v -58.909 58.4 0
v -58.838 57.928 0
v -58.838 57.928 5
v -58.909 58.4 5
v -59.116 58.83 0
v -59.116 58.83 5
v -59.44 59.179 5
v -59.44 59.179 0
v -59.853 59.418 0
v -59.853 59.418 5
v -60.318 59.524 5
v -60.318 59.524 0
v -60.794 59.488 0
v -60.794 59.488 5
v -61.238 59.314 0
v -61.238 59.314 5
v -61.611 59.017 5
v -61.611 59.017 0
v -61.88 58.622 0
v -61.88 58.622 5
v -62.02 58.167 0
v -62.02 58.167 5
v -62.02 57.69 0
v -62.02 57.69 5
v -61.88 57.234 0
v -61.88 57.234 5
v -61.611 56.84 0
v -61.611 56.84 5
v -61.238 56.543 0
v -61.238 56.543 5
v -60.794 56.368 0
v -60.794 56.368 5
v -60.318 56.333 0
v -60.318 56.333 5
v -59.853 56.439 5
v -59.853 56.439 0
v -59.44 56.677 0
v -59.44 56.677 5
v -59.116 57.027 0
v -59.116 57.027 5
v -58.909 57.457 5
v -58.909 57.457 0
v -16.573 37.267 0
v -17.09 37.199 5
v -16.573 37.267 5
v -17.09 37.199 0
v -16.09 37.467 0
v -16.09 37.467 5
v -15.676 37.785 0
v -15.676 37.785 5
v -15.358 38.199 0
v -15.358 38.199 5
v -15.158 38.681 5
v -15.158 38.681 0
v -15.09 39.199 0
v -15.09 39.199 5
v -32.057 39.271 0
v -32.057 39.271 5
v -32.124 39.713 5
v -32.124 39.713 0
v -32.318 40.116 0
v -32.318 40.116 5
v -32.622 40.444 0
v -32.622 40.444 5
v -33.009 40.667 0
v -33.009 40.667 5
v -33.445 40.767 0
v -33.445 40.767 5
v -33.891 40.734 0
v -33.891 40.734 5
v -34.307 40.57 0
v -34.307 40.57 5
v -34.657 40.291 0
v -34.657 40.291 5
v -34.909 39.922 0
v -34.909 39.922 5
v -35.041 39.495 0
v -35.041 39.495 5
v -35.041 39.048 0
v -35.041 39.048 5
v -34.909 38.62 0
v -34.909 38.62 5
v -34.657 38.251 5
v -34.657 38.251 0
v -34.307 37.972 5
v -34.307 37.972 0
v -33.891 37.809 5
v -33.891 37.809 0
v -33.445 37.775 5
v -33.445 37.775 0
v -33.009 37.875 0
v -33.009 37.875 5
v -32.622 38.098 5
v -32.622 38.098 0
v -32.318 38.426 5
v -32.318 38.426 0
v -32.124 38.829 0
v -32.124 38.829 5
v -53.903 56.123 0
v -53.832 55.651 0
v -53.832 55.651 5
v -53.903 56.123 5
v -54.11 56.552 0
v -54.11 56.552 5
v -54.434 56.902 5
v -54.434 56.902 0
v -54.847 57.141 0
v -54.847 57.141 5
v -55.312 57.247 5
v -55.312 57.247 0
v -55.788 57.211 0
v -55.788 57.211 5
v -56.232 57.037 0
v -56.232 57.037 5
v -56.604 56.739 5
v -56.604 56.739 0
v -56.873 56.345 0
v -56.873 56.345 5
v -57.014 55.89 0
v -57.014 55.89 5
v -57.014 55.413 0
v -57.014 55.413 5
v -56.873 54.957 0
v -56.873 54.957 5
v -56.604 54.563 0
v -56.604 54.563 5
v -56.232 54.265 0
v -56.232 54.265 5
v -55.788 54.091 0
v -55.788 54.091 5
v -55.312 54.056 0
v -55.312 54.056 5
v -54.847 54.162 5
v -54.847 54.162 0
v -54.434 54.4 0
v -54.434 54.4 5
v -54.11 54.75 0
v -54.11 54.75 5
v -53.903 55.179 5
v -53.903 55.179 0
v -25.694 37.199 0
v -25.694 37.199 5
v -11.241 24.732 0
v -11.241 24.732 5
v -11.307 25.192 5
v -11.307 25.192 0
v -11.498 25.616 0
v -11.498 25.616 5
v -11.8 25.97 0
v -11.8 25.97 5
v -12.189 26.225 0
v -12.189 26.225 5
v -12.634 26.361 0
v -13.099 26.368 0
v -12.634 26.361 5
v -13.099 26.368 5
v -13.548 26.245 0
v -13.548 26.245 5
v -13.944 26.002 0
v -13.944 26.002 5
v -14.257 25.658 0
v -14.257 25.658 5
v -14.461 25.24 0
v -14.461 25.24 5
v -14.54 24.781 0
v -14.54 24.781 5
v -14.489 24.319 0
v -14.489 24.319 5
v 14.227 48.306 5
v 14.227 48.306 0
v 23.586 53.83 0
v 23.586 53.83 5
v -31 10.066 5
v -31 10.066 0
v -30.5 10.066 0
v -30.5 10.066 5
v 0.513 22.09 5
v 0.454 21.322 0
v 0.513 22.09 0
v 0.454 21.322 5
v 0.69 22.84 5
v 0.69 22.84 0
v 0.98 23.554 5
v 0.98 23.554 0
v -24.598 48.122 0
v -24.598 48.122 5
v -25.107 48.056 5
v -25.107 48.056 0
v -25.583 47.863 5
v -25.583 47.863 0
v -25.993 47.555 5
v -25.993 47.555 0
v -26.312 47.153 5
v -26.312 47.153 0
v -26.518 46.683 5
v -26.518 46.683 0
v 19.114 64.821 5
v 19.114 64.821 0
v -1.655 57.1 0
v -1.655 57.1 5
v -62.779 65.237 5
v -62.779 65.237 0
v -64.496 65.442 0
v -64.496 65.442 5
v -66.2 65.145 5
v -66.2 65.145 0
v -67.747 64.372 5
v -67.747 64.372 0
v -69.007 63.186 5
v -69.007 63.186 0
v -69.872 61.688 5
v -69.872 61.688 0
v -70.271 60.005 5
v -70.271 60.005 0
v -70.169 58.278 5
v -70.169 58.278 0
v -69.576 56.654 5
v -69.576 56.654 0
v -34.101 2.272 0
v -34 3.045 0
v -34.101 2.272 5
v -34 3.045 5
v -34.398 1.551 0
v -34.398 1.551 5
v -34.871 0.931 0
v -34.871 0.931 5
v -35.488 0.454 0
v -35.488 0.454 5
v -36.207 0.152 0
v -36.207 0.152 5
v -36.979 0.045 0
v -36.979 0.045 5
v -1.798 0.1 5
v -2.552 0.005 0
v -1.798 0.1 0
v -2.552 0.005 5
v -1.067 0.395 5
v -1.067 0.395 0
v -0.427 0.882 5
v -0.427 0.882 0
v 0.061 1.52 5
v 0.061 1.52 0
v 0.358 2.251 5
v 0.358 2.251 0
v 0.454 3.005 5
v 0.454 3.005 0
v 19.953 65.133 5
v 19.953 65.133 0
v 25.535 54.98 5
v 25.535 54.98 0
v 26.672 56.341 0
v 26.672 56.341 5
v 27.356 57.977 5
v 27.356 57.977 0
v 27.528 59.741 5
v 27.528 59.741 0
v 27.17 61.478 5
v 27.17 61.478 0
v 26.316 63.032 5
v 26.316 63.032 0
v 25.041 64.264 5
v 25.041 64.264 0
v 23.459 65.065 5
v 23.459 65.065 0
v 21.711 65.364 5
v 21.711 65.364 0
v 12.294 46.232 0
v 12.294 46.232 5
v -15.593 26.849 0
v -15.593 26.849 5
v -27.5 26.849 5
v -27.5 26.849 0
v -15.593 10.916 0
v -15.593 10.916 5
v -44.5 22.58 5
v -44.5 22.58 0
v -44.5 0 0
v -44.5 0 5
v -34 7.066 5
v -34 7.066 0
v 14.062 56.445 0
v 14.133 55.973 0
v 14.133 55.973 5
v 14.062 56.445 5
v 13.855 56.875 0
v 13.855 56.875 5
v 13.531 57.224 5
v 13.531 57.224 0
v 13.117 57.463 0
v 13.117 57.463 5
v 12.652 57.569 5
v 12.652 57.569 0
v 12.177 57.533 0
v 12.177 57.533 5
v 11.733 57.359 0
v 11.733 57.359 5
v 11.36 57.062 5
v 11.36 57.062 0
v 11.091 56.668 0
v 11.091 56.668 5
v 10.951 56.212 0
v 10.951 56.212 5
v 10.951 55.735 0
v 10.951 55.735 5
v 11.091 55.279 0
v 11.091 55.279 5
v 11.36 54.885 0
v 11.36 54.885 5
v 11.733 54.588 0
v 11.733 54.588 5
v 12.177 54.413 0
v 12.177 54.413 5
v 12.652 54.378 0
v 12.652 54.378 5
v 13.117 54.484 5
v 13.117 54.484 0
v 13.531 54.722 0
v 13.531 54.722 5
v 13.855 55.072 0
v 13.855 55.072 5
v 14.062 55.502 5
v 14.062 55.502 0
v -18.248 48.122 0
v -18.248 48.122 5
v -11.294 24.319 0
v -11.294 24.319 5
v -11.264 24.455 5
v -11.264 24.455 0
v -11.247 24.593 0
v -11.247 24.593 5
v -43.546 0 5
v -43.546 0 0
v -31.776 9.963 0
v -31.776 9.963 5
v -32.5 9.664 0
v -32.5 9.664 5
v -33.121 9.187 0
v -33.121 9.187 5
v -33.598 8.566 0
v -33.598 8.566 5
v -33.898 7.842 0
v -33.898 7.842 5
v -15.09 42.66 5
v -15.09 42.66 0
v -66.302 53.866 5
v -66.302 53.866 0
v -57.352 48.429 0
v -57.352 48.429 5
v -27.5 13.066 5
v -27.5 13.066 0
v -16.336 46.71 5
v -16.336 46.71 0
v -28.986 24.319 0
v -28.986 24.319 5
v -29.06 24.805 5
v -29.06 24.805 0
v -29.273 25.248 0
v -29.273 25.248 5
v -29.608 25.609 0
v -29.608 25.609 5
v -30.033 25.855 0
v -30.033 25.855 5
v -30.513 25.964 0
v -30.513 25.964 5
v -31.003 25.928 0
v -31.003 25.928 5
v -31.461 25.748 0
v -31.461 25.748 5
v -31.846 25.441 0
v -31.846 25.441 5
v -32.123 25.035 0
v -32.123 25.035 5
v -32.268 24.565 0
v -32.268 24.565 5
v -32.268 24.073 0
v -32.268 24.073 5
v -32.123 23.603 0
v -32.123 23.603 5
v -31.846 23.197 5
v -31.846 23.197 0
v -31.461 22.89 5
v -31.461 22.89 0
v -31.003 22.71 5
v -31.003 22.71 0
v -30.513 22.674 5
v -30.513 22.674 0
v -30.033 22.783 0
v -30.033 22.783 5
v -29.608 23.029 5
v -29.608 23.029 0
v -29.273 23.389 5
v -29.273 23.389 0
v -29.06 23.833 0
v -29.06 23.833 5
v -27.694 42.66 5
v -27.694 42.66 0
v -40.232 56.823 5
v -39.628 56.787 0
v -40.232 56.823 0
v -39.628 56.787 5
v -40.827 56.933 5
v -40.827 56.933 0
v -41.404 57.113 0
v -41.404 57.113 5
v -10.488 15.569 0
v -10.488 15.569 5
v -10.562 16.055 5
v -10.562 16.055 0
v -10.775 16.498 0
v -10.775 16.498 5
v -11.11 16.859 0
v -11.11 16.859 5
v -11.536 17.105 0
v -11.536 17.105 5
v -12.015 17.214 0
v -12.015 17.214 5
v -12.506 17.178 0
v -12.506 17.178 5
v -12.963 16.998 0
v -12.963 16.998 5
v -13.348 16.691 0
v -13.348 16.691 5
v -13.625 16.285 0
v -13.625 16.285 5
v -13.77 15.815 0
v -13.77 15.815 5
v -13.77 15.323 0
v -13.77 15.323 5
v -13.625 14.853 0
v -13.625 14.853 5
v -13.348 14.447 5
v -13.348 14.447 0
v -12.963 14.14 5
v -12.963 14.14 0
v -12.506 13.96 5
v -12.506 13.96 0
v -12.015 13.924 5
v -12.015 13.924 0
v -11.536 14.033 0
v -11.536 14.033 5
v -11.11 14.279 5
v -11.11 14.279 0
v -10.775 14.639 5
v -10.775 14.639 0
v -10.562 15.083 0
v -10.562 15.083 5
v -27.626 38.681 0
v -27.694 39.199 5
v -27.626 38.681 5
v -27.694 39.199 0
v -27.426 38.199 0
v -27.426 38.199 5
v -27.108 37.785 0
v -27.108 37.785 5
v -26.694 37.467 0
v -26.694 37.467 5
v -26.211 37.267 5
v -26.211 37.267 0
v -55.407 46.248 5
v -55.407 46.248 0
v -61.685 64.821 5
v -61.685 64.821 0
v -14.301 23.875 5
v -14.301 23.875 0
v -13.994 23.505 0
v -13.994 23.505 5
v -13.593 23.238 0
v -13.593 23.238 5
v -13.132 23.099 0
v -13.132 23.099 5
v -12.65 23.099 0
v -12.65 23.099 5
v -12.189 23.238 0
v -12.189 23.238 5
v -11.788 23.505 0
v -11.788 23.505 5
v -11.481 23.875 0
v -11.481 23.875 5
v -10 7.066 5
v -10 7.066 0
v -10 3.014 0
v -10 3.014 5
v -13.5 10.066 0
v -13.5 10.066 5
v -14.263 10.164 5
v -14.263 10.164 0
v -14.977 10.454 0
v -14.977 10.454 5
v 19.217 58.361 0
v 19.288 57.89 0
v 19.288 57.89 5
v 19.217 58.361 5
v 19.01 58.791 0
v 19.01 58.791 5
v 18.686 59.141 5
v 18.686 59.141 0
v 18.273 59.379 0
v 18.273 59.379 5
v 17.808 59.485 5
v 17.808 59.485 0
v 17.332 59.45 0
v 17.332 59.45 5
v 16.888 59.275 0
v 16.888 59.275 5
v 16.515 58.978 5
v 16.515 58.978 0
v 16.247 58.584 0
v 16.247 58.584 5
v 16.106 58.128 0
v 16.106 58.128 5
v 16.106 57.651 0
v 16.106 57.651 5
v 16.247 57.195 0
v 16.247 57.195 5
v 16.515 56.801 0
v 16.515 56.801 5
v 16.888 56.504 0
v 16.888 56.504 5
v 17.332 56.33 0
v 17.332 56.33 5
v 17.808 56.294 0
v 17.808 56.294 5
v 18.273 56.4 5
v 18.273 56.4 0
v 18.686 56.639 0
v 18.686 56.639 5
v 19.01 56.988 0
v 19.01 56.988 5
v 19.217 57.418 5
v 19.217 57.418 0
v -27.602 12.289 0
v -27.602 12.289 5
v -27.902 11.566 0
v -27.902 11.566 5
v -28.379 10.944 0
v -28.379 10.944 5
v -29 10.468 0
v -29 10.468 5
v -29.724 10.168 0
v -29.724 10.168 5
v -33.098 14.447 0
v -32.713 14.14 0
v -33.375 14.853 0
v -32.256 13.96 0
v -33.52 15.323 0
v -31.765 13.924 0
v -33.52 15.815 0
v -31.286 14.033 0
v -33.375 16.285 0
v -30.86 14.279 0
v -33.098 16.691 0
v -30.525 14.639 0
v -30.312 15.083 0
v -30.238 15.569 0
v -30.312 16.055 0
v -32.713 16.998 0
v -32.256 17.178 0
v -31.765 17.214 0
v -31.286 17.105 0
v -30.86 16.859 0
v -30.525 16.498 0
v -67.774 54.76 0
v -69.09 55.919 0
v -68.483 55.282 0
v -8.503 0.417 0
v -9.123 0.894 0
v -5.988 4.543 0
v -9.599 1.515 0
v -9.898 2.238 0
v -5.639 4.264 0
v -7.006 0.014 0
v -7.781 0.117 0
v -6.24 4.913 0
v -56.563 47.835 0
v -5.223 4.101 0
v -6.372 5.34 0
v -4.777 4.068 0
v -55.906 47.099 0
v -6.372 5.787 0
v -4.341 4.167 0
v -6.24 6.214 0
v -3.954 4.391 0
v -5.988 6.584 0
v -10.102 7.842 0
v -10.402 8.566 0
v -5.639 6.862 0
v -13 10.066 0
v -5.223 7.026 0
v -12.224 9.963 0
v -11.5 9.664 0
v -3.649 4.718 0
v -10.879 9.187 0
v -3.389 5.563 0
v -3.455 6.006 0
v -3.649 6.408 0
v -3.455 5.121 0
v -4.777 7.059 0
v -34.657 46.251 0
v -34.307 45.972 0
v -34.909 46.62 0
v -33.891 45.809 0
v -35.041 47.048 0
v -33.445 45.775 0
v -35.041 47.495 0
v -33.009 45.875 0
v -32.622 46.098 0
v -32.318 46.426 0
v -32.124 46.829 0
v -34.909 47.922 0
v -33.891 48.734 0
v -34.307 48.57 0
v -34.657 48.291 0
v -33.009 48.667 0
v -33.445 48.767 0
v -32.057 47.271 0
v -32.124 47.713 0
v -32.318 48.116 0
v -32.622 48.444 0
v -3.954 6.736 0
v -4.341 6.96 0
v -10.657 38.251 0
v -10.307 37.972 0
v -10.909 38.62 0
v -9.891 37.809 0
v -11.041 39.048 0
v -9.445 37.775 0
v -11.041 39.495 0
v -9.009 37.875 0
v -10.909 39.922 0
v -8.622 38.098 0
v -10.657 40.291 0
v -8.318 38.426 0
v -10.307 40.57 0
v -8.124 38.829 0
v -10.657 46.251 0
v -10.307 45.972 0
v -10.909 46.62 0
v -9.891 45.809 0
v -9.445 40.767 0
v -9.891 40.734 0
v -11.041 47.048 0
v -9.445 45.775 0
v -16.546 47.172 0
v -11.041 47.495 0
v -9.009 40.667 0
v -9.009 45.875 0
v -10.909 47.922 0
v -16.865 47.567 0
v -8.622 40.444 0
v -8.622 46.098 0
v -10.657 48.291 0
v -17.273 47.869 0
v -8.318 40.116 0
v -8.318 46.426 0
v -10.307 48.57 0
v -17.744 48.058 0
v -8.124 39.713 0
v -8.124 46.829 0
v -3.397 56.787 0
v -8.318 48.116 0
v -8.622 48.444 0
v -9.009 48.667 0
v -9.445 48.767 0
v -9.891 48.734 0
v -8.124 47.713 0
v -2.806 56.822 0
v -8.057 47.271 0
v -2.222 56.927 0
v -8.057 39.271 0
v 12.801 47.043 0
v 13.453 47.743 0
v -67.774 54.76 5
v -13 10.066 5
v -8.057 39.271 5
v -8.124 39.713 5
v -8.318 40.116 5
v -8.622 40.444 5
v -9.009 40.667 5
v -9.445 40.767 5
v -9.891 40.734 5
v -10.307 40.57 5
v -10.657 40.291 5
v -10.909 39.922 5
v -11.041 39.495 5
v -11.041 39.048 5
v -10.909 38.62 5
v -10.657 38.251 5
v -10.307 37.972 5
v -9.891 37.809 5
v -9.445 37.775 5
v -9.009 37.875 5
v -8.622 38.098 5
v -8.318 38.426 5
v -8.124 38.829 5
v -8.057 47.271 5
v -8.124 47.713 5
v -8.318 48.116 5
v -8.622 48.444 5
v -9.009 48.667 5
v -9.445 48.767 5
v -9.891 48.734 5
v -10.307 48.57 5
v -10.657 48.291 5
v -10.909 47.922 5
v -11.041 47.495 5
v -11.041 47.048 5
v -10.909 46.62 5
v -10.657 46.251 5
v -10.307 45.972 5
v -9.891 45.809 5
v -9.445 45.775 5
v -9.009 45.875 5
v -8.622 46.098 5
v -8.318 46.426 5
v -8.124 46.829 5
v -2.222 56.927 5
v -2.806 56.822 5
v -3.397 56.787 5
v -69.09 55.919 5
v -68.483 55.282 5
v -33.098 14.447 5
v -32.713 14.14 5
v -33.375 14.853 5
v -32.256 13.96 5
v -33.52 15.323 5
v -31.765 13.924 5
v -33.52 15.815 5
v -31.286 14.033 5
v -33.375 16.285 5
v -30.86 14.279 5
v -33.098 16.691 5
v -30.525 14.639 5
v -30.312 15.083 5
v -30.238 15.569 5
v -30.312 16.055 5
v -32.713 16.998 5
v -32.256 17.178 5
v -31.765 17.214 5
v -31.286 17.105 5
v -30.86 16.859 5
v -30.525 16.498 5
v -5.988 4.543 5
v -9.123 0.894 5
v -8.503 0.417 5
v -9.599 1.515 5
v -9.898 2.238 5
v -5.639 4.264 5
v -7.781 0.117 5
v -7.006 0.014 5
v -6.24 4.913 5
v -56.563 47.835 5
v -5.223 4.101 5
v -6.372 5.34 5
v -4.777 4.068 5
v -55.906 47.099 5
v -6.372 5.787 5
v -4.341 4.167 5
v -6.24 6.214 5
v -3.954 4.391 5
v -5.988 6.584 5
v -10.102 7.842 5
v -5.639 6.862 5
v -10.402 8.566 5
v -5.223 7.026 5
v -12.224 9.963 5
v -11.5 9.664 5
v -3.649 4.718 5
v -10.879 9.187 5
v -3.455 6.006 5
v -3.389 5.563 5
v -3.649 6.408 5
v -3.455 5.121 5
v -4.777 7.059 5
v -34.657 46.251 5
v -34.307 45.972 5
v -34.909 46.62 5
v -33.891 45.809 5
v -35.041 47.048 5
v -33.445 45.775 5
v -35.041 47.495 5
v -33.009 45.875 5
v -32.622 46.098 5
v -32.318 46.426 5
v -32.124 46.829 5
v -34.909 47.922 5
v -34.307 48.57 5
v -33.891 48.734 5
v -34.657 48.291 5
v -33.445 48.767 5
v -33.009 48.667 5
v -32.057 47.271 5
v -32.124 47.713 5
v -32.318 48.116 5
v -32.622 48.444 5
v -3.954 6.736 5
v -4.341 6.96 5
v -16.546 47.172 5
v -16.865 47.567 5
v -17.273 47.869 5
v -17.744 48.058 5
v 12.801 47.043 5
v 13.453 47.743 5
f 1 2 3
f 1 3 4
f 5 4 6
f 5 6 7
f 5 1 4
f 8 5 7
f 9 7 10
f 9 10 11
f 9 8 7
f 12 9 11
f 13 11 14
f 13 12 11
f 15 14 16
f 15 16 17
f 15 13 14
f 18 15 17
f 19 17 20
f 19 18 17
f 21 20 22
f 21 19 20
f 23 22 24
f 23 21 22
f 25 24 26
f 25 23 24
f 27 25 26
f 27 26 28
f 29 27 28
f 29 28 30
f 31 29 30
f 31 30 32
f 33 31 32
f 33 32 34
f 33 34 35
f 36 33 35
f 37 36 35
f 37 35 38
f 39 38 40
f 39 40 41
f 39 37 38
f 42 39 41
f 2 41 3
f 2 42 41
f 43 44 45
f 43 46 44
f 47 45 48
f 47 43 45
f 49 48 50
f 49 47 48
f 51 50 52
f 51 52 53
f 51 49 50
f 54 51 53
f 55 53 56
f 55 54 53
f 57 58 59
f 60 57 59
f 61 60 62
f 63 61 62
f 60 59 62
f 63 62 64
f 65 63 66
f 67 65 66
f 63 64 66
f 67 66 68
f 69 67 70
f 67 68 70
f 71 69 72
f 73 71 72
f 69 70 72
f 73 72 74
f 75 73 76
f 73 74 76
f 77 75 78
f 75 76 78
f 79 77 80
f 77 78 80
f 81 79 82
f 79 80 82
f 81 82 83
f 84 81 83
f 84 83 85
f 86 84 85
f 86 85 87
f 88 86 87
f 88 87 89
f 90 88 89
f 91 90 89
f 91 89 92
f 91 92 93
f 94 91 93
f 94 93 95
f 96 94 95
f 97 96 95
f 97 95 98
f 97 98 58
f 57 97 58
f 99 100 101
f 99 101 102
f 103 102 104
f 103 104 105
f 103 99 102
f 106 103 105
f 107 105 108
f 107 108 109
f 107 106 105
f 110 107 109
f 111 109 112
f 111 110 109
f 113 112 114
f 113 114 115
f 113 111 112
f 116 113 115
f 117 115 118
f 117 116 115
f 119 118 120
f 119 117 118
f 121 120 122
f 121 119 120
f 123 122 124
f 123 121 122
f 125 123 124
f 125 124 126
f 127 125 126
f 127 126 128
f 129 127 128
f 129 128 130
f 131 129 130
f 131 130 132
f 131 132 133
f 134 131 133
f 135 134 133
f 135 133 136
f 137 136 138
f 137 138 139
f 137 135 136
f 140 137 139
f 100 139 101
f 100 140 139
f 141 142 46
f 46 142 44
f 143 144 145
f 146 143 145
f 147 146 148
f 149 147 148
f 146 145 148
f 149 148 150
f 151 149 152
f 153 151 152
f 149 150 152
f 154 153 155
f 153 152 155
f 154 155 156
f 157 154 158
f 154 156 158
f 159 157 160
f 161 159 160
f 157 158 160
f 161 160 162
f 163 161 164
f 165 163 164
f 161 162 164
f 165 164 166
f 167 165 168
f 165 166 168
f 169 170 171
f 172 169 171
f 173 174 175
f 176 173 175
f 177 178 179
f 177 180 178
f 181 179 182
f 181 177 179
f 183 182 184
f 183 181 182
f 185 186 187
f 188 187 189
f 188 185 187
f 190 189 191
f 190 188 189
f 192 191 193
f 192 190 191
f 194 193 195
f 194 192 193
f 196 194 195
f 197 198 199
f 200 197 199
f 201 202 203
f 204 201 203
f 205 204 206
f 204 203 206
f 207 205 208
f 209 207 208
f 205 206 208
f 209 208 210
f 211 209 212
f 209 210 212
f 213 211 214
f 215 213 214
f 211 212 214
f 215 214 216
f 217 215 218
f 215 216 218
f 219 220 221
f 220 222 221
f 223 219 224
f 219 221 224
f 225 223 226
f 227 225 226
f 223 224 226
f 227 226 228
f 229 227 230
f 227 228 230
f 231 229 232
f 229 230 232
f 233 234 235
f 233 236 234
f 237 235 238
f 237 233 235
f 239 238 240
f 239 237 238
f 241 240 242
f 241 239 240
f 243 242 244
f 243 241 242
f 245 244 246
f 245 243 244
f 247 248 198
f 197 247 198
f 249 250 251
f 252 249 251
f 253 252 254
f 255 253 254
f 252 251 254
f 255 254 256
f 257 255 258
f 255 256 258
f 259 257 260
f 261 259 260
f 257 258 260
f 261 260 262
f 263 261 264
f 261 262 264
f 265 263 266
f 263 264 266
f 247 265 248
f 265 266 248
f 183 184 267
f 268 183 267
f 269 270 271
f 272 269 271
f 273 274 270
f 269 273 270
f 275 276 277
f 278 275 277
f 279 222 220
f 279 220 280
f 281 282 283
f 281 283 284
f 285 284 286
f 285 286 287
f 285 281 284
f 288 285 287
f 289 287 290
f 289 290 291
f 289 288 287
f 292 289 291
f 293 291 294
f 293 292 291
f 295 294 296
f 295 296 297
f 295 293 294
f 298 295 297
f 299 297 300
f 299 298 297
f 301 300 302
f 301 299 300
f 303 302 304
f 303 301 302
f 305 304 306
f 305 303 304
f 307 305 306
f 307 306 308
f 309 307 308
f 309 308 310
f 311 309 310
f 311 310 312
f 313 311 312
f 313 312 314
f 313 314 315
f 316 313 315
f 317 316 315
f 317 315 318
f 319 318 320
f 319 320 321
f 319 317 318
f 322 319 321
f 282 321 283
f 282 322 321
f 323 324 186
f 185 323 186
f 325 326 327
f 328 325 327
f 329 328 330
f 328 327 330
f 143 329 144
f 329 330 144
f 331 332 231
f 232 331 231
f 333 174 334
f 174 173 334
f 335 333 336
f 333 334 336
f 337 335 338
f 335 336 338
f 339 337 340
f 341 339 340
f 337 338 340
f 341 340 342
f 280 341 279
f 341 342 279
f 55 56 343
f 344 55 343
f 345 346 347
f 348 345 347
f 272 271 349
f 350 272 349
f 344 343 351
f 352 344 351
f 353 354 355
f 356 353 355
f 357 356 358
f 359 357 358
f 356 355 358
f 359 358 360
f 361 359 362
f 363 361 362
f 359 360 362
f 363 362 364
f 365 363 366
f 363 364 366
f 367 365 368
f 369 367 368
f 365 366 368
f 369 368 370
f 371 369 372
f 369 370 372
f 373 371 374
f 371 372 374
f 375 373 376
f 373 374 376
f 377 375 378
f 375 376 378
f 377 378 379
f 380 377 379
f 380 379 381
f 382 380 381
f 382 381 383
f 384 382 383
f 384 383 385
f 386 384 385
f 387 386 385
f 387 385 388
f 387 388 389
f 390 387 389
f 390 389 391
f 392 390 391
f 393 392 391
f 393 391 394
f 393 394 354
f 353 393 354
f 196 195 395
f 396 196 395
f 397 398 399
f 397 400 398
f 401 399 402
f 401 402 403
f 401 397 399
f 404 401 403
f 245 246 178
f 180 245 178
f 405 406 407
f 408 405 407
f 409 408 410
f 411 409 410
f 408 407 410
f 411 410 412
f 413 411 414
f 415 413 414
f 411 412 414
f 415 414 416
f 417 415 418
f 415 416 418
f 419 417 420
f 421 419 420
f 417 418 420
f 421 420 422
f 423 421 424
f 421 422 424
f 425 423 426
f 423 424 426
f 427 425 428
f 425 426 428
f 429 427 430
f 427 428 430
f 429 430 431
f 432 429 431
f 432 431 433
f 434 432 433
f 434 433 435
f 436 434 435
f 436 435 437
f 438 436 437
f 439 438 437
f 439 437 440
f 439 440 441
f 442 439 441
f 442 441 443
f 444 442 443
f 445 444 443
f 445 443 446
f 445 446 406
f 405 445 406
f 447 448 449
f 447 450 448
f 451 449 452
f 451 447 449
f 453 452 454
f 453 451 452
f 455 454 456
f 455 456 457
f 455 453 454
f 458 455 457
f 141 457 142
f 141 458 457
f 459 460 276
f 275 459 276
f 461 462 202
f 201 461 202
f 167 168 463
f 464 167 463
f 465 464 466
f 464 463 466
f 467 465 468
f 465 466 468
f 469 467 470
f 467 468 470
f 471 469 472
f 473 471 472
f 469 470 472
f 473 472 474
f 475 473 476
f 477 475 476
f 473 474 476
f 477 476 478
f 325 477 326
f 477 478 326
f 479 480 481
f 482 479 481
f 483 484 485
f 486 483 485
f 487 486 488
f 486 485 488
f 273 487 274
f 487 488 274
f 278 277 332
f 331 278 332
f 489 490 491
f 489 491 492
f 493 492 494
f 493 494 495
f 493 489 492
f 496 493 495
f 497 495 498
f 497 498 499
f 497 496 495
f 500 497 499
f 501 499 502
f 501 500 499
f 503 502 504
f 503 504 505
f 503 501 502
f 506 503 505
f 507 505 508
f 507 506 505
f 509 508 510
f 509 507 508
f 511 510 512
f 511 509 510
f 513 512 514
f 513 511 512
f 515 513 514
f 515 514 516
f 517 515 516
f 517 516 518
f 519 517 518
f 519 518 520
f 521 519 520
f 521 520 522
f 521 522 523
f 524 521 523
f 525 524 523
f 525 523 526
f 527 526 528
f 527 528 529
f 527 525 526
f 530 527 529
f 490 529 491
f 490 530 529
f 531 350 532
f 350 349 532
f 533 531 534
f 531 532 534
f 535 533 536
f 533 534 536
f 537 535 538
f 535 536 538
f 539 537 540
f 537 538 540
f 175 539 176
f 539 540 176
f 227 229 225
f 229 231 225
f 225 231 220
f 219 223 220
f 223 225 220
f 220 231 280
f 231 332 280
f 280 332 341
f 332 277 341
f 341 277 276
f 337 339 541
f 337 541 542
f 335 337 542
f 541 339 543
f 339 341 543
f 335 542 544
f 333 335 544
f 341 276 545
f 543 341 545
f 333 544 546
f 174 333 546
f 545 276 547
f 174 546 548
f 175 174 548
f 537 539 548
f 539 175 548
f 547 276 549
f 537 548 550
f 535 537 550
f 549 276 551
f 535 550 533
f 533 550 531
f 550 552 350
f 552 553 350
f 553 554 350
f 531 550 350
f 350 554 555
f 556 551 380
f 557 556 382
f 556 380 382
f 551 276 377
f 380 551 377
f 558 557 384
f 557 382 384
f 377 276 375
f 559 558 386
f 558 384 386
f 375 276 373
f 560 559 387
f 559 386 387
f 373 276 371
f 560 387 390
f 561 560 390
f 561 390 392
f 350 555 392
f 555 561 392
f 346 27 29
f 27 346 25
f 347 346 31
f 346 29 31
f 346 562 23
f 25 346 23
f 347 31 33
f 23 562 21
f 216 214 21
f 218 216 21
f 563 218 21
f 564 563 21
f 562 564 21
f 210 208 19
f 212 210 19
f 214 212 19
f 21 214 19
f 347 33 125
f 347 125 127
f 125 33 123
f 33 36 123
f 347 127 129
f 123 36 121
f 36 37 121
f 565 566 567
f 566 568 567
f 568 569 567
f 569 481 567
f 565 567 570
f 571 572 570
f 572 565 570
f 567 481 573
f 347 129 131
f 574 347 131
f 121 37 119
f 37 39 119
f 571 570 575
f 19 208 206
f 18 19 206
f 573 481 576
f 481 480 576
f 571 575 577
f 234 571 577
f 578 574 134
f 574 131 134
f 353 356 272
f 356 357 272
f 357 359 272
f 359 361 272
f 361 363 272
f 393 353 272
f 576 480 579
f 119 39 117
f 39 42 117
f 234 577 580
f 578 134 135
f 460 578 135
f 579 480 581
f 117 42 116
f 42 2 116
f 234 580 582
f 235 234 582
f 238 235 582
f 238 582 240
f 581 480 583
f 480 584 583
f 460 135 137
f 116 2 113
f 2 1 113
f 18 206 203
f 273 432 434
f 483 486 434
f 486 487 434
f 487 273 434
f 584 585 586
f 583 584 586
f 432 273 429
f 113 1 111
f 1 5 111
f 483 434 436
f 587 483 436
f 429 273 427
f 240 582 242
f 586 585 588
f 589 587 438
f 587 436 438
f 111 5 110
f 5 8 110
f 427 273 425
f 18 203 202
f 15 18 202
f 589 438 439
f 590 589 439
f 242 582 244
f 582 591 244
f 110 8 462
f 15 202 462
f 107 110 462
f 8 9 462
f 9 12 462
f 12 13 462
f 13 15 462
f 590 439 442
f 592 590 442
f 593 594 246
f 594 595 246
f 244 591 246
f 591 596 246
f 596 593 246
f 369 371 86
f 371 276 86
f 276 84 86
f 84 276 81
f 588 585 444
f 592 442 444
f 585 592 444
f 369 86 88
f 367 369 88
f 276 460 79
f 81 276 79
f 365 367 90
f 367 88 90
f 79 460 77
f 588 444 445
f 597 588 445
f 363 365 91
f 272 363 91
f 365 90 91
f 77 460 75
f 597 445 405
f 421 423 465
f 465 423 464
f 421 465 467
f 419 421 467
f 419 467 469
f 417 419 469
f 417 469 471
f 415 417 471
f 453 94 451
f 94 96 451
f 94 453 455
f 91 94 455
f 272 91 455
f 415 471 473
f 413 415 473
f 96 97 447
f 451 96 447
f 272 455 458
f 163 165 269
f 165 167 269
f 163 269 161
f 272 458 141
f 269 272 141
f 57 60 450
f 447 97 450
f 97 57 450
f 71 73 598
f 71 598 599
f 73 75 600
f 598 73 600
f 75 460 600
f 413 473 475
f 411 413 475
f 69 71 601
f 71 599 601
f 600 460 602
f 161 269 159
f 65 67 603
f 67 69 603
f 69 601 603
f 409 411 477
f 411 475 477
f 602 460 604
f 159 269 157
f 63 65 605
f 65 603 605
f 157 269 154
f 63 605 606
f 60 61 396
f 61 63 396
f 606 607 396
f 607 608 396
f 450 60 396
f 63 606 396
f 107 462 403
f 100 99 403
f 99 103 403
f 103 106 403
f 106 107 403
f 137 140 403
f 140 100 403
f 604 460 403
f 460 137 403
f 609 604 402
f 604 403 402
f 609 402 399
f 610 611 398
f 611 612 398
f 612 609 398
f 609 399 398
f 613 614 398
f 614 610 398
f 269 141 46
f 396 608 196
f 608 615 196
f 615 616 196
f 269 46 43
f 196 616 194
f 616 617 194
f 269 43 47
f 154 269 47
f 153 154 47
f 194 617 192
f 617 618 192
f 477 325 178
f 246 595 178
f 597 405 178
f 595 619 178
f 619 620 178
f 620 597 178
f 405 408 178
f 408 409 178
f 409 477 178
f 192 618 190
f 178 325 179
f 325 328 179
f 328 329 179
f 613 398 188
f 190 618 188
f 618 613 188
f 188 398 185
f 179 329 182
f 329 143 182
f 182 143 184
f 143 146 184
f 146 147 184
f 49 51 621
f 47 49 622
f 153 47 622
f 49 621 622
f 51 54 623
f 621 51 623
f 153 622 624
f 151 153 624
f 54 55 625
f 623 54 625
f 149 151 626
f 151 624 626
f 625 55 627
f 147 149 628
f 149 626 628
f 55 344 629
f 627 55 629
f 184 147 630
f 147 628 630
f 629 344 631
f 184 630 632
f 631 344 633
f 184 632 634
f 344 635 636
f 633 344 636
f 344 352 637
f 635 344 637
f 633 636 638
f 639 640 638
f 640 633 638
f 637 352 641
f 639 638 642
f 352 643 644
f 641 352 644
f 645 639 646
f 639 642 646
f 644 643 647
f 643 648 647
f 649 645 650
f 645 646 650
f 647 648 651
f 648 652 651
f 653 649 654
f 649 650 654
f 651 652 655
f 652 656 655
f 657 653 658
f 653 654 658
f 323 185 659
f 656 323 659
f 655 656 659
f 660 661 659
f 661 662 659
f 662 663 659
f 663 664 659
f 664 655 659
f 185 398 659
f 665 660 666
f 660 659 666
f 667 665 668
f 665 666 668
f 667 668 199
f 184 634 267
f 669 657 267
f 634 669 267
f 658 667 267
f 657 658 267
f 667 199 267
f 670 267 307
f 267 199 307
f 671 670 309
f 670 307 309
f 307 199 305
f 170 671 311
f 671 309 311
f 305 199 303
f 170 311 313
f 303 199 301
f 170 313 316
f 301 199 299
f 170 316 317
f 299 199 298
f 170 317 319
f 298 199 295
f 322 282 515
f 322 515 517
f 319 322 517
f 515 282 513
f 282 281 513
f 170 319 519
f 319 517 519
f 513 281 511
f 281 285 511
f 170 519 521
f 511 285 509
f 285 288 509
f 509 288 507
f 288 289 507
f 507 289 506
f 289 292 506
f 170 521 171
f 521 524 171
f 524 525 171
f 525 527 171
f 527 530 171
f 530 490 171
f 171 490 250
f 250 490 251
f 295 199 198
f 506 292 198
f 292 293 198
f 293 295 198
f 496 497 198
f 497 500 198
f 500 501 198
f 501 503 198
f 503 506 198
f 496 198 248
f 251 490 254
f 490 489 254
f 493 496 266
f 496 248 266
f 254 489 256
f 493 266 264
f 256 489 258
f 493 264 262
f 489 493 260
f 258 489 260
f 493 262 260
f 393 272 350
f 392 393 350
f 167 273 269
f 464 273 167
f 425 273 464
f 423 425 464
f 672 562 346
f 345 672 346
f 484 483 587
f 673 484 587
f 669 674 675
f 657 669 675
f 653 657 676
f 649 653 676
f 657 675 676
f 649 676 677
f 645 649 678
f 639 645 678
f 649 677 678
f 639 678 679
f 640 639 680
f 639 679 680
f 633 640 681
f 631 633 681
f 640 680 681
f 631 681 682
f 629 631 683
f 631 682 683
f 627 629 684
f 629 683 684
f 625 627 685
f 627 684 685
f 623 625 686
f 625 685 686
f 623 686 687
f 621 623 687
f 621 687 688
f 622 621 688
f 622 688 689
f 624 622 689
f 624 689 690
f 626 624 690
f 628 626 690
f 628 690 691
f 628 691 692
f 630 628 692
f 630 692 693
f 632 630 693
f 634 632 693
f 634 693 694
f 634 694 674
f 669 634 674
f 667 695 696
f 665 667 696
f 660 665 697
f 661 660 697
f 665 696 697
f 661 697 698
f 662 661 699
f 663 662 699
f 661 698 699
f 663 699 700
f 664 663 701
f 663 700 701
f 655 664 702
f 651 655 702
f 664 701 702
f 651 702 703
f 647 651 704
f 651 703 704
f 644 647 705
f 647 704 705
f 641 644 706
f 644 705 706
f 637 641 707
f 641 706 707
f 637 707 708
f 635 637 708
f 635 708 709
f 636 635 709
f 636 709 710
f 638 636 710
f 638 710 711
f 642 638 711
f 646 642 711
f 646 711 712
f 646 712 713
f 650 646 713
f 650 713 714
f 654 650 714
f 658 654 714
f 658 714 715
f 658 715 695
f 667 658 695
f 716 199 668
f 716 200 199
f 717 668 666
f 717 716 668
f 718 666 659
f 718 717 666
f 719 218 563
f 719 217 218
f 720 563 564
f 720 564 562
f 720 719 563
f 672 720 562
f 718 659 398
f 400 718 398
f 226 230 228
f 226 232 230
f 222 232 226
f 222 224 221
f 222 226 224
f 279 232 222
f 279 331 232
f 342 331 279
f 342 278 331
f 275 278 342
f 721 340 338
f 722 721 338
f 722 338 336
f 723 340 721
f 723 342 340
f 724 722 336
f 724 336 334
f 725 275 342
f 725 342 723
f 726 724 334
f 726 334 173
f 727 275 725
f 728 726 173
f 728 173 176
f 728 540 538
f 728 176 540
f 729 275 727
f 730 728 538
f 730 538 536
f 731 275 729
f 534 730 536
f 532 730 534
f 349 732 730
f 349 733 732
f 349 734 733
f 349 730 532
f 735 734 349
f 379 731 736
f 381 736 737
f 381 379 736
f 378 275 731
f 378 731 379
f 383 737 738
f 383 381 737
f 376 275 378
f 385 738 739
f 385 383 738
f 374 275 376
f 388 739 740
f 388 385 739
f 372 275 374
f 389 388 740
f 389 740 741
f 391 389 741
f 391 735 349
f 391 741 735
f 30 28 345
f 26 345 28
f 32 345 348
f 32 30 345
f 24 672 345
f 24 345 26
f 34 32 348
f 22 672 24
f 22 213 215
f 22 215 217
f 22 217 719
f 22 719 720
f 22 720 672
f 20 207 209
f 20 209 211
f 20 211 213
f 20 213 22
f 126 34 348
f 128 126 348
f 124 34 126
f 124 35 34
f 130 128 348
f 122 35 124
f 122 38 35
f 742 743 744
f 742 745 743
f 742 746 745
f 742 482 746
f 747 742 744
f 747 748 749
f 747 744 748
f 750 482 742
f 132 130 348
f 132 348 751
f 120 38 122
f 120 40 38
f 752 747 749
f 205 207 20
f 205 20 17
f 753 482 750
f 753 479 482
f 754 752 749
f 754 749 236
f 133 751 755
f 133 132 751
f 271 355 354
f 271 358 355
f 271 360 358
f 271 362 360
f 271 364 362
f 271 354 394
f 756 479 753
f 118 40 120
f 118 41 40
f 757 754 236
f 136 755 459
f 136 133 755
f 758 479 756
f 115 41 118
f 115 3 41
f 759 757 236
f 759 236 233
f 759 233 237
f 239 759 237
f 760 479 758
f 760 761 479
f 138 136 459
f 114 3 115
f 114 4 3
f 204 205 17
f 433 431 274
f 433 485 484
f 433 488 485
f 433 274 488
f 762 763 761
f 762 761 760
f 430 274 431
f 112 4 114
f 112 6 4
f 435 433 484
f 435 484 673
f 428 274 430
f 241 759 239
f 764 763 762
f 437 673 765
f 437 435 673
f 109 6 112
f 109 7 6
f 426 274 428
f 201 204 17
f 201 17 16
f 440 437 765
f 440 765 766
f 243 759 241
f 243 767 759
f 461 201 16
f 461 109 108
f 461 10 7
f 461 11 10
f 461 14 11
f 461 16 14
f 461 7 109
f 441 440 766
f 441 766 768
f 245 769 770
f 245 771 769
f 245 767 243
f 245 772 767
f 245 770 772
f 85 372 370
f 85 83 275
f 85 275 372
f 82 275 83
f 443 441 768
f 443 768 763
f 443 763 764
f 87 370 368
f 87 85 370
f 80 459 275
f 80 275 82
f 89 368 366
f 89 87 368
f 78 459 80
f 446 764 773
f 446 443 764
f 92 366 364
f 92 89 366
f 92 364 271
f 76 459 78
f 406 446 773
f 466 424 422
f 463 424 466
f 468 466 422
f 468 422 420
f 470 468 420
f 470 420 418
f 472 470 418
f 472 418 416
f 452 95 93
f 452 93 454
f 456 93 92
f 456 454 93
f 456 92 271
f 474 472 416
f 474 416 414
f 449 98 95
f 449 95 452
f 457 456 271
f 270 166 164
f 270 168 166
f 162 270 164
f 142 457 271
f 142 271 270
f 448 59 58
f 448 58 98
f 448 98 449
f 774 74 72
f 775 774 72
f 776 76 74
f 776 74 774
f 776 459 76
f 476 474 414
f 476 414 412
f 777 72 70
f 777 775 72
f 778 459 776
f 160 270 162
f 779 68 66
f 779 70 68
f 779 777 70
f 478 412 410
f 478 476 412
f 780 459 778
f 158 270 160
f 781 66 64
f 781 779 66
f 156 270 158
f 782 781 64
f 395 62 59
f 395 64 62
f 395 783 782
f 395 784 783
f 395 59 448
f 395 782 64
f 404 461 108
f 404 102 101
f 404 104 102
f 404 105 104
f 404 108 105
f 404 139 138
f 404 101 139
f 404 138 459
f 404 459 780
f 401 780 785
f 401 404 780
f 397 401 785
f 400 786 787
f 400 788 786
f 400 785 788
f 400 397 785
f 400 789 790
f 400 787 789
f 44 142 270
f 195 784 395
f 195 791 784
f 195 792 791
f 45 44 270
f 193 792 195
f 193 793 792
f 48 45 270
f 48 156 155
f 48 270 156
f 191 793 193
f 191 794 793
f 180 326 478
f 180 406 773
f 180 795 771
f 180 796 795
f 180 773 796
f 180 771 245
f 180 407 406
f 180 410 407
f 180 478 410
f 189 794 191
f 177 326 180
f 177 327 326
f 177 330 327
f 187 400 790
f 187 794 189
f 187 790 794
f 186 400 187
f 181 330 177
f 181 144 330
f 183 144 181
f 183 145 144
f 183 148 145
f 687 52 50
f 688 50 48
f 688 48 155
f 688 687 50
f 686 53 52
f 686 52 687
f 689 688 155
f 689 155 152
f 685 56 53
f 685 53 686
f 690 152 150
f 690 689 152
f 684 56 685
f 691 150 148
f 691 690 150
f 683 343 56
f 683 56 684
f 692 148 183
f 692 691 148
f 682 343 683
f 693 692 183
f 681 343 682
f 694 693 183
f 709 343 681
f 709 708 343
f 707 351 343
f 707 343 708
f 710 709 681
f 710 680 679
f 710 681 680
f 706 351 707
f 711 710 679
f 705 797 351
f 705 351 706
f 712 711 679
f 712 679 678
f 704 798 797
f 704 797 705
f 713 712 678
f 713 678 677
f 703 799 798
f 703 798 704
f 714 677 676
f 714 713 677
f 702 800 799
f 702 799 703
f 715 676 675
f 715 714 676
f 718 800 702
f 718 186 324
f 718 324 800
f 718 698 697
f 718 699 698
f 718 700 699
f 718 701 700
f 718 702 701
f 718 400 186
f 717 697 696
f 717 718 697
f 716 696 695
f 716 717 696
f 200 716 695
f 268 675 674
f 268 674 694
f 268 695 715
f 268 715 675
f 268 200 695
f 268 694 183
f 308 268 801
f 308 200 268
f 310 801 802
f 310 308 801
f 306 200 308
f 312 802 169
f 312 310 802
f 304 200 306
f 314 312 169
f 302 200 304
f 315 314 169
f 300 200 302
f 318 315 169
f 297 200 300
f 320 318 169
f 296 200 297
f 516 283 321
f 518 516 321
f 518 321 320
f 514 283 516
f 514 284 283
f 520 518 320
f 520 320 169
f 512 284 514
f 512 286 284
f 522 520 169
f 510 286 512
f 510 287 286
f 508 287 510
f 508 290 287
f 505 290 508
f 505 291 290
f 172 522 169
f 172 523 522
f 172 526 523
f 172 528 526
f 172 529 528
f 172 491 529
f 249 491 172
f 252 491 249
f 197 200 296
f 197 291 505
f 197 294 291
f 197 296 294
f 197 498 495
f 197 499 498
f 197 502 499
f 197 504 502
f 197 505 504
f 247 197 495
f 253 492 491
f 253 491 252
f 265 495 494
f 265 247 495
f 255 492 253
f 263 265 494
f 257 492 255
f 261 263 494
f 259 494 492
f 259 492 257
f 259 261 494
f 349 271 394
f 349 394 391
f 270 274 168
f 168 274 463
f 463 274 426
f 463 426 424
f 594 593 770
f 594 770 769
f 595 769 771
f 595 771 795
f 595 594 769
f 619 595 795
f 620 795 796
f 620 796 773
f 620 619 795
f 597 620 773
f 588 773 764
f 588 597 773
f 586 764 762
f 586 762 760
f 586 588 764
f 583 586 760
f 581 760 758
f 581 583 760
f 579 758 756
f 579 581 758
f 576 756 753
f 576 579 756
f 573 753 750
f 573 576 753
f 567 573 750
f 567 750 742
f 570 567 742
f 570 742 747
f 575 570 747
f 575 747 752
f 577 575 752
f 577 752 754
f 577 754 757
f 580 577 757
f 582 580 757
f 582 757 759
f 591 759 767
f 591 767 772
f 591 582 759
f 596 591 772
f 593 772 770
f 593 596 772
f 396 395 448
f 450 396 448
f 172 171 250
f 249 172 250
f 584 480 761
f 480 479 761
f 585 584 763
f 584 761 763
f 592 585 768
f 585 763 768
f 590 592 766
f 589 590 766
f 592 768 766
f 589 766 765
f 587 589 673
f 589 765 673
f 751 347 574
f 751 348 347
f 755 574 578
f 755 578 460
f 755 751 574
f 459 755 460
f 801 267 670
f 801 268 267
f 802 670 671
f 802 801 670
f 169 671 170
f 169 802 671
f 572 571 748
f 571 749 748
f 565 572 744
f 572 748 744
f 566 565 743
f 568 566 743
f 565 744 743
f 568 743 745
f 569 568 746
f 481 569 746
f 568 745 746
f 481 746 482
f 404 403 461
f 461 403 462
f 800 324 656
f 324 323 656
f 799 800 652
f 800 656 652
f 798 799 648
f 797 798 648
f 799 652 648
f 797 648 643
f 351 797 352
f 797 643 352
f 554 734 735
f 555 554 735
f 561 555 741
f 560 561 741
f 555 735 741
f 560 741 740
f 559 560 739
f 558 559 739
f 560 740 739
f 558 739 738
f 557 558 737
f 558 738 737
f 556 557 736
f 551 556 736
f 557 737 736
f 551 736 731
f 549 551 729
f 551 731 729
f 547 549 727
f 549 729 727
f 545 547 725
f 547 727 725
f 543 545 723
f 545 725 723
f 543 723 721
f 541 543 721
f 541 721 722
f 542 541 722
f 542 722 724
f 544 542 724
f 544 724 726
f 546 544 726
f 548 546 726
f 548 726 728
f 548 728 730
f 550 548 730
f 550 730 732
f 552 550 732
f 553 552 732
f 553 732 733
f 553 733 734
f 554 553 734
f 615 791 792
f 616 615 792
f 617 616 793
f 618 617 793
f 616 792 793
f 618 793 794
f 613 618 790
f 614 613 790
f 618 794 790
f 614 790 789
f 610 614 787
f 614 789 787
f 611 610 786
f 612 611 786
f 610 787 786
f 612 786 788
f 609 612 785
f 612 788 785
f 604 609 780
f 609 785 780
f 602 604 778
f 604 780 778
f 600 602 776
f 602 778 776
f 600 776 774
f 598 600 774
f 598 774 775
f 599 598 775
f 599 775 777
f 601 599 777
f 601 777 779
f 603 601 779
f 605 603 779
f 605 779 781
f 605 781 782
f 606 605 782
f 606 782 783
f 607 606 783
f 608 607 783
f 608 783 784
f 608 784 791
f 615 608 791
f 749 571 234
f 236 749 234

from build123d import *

# Parameters (mm, degrees)
F0_R      = 1.5
F0_R_2    = 1.6
F1_DEPTH  = 5
F2_R      = 3
F3_R      = 2
F4_R      = 5
F5_R      = 5
F6_R      = 1.5
F7_DEPTH  = 25
F9_DEPTH  = 25
F10_R     = 2
F11_R     = 1.65
F12_DEPTH = 25
F14_DEPTH = 25


with BuildPart() as f1:
    # F0 (on Top) → F1 (new body)
    with BuildSketch(Plane.XY):
        with BuildLine():
            Line((-9.9999813339, 0.0193215341), (0, 0))
            Line((0, 0), (0.4539924878, 0))
            Line((0.4539924878, 0), (0.4539924878, 22.4998891728))
            Line((0.4539924878, 22.4998891728), (12.9539924878, 47.5548288056))
            Line((12.9539924878, 47.5548288056), (23.5864712774, 53.8304637924))
            Line((23.5864712774, 53.8304637924), (25.5346026442, 54.9803143218))
            ThreePointArc((25.5346026442, 54.9803143218), (26.8013490925, 62.2870919693), (19.9533457596, 65.1328777146))
            Line((19.9533457596, 65.1328777146), (19.1141014773, 64.8209017638))
            Line((19.1141014773, 64.8209017638), (-2.4981679914, 56.7868782273))
            Line((-2.4981679914, 56.7868782273), (-40.5460603337, 56.7868782273))
            Line((-40.5460603337, 56.7868782273), (-61.6849283551, 64.8209017638))
            Line((-61.6849283551, 64.8209017638), (-62.7787610133, 65.2366230461))
            ThreePointArc((-62.7787610133, 65.2366230461), (-69.534777582, 62.3971715251), (-68.4220804384, 55.1536813523))
            Line((-68.4220804384, 55.1536813523), (-66.3019318016, 53.8657127229))
            Line((-66.3019318016, 53.8657127229), (-56.0460603337, 47.6353756185))
            Line((-56.0460603337, 47.6353756185), (-44.4999813339, 22.5804359857))
            Line((-44.4999813339, 22.5804359857), (-44.4999813339, 0))
            Line((-44.4999813339, 0), (-43.5460603337, 0))
            Line((-43.5460603337, 0), (-33.9999813339, 0.0656933026))
            Line((-33.9999813339, 0.0656933026), (-33.9999813339, 10.0656933026))
            Line((-33.9999813339, 10.0656933026), (-27.4999813339, 10.0656933026))
            Line((-27.4999813339, 10.0656933026), (-27.4999813339, 22.5656933026))
            Line((-27.4999813339, 22.5656933026), (-27.4999813339, 26.3816152201))
            Line((-27.4999813339, 26.3816152201), (-16.4999813339, 26.3816152201))
            Line((-16.4999813339, 26.3816152201), (-16.4999813339, 10.0656933026))
            Line((-16.4999813339, 10.0656933026), (-9.9999813339, 10.0656933026))
            Line((-9.9999813339, 10.0656933026), (-9.9999813339, 0.0193215341))
        make_face()
        with Locations((-4.888762403, 5.563379294)):
            Circle(F0_R, mode=Mode.SUBTRACT)
        with Locations((-55.4315750417, 55.6511066578)):
            Circle(F0_R_2, mode=Mode.SUBTRACT)
        with Locations((-60.4380198654, 57.9282781987)):
            Circle(F0_R_2, mode=Mode.SUBTRACT)
        with Locations((12.5329179775, 55.9733003324)):
            Circle(F0_R_2, mode=Mode.SUBTRACT)
        with Locations((17.6882422101, 57.8897115767)):
            Circle(F0_R_2, mode=Mode.SUBTRACT)
    extrude(amount=F1_DEPTH)

    # F2
    f2_edges = [f1.edges().sort_by_distance(p)[0] for p in [
        (-27.499981, 10.065693, 2.5),
        (-33.999981, 10.065693, 2.5),
        (-16.499981, 10.065693, 2.5),
        (-9.999981, 10.065693, 2.5),
        (-9.999981, 0.019322, 2.5),
        (-33.999981, 0.065693, 2.5),
        (-43.54606, 0, 2.5),
        (0.453992, 0, 2.5),
    ]]
    fillet(f2_edges, radius=F2_R)

    # F3
    f3_edges = [f1.edges().sort_by_distance(p)[0] for p in [
        (-16.499981, 26.381615, 2.5),
    ]]
    fillet(f3_edges, radius=F3_R)

    # F4
    f4_edges = [f1.edges().sort_by_distance(p)[0] for p in [
        (-43.54606, 0, 2.5),
        (0.453992, 22.499889, 2.5),
    ]]
    fillet(f4_edges, radius=F4_R)

    # F5
    f5_edges = [f1.edges().sort_by_distance(p)[0] for p in [
        (12.953992, 47.554829, 2.5),
        (-2.498168, 56.786878, 2.5),
        (-40.54606, 56.786878, 2.5),
        (-68.42208, 55.153681, 2.5),
        (-56.04606, 47.635376, 2.5),
    ]]
    fillet(f5_edges, radius=F5_R)

    # F6 (on face) → F7 (cut)
    with BuildSketch(Plane.XY.offset(5)):
        with Locations((-33.5573396883, 47.271139662)):
            Circle(F6_R)
        with Locations((-33.5573396883, 39.271139662)):
            Circle(F6_R)
        with Locations((-9.5573396883, 39.271139662)):
            Circle(F6_R)
        with Locations((-9.5573396883, 47.271139662)):
            Circle(F6_R)
    extrude(amount=-F7_DEPTH, mode=Mode.SUBTRACT)

    # F8 (on face) → F9 (cut)
    with BuildSketch(Plane.XY.offset(5)):
        Polygon((-16.7706497014, 48.1220260262), (-26.0973814875, 48.1220260262), (-27.693849057, 42.6604263484), (-27.693849057, 37.1988266706), (-15.0901572779, 37.1988266706), (-15.0901572779, 42.6604263484), align=None)
    extrude(amount=-F9_DEPTH, mode=Mode.SUBTRACT)

    # F10
    f10_edges = [f1.edges().sort_by_distance(p)[0] for p in [
        (-26.097381, 48.122026, 2.5),
        (-16.77065, 48.122026, 2.5),
        (-27.693849, 37.198827, 2.5),
        (-15.090157, 37.198827, 2.5),
    ]]
    fillet(f10_edges, radius=F10_R)

    # F11 (on face) → F12 (cut)
    with BuildSketch(Plane.XY.offset(5)):
        with Locations((-31.8884050022, 15.5689349914)):
            Circle(F11_R)
        with Locations((-12.1384050022, 15.5689349914)):
            Circle(F11_R)
        with Locations((-30.6362952974, 24.3189349914)):
            Circle(F11_R)
        with BuildLine():
            ThreePointArc((-11.241093269, 24.7316152201), (-13.0990926805, 26.368452489), (-14.4886523536, 24.3189349914))
            Line((-14.4886523536, 24.3189349914), (-11.2935341844, 24.3189349914))
            ThreePointArc((-11.2935341844, 24.3189349914), (-11.2542560001, 24.5236158086), (-11.241093269, 24.7316152201))
        make_face()
        with BuildLine():
            Line((-11.2935341844, 24.3189349914), (-14.4886523536, 24.3189349914))
            ThreePointArc((-14.4886523536, 24.3189349914), (-12.891093269, 23.0816152201), (-11.2935341844, 24.3189349914))
        make_face()
    extrude(amount=-F12_DEPTH, mode=Mode.SUBTRACT)

    # F13 (on face) → F14 (cut)
    with BuildSketch(Plane.XY.offset(5)):
        Polygon((-27.4999813339, 26.8493555486), (-27.4999813339, 24.3816152201), (-15.5926216394, 8.9839491993), (-15.5926216394, 26.8493555486), (-16.1031354219, 26.8493555486), align=None)
    extrude(amount=-F14_DEPTH, mode=Mode.SUBTRACT)


solid = f1.part
